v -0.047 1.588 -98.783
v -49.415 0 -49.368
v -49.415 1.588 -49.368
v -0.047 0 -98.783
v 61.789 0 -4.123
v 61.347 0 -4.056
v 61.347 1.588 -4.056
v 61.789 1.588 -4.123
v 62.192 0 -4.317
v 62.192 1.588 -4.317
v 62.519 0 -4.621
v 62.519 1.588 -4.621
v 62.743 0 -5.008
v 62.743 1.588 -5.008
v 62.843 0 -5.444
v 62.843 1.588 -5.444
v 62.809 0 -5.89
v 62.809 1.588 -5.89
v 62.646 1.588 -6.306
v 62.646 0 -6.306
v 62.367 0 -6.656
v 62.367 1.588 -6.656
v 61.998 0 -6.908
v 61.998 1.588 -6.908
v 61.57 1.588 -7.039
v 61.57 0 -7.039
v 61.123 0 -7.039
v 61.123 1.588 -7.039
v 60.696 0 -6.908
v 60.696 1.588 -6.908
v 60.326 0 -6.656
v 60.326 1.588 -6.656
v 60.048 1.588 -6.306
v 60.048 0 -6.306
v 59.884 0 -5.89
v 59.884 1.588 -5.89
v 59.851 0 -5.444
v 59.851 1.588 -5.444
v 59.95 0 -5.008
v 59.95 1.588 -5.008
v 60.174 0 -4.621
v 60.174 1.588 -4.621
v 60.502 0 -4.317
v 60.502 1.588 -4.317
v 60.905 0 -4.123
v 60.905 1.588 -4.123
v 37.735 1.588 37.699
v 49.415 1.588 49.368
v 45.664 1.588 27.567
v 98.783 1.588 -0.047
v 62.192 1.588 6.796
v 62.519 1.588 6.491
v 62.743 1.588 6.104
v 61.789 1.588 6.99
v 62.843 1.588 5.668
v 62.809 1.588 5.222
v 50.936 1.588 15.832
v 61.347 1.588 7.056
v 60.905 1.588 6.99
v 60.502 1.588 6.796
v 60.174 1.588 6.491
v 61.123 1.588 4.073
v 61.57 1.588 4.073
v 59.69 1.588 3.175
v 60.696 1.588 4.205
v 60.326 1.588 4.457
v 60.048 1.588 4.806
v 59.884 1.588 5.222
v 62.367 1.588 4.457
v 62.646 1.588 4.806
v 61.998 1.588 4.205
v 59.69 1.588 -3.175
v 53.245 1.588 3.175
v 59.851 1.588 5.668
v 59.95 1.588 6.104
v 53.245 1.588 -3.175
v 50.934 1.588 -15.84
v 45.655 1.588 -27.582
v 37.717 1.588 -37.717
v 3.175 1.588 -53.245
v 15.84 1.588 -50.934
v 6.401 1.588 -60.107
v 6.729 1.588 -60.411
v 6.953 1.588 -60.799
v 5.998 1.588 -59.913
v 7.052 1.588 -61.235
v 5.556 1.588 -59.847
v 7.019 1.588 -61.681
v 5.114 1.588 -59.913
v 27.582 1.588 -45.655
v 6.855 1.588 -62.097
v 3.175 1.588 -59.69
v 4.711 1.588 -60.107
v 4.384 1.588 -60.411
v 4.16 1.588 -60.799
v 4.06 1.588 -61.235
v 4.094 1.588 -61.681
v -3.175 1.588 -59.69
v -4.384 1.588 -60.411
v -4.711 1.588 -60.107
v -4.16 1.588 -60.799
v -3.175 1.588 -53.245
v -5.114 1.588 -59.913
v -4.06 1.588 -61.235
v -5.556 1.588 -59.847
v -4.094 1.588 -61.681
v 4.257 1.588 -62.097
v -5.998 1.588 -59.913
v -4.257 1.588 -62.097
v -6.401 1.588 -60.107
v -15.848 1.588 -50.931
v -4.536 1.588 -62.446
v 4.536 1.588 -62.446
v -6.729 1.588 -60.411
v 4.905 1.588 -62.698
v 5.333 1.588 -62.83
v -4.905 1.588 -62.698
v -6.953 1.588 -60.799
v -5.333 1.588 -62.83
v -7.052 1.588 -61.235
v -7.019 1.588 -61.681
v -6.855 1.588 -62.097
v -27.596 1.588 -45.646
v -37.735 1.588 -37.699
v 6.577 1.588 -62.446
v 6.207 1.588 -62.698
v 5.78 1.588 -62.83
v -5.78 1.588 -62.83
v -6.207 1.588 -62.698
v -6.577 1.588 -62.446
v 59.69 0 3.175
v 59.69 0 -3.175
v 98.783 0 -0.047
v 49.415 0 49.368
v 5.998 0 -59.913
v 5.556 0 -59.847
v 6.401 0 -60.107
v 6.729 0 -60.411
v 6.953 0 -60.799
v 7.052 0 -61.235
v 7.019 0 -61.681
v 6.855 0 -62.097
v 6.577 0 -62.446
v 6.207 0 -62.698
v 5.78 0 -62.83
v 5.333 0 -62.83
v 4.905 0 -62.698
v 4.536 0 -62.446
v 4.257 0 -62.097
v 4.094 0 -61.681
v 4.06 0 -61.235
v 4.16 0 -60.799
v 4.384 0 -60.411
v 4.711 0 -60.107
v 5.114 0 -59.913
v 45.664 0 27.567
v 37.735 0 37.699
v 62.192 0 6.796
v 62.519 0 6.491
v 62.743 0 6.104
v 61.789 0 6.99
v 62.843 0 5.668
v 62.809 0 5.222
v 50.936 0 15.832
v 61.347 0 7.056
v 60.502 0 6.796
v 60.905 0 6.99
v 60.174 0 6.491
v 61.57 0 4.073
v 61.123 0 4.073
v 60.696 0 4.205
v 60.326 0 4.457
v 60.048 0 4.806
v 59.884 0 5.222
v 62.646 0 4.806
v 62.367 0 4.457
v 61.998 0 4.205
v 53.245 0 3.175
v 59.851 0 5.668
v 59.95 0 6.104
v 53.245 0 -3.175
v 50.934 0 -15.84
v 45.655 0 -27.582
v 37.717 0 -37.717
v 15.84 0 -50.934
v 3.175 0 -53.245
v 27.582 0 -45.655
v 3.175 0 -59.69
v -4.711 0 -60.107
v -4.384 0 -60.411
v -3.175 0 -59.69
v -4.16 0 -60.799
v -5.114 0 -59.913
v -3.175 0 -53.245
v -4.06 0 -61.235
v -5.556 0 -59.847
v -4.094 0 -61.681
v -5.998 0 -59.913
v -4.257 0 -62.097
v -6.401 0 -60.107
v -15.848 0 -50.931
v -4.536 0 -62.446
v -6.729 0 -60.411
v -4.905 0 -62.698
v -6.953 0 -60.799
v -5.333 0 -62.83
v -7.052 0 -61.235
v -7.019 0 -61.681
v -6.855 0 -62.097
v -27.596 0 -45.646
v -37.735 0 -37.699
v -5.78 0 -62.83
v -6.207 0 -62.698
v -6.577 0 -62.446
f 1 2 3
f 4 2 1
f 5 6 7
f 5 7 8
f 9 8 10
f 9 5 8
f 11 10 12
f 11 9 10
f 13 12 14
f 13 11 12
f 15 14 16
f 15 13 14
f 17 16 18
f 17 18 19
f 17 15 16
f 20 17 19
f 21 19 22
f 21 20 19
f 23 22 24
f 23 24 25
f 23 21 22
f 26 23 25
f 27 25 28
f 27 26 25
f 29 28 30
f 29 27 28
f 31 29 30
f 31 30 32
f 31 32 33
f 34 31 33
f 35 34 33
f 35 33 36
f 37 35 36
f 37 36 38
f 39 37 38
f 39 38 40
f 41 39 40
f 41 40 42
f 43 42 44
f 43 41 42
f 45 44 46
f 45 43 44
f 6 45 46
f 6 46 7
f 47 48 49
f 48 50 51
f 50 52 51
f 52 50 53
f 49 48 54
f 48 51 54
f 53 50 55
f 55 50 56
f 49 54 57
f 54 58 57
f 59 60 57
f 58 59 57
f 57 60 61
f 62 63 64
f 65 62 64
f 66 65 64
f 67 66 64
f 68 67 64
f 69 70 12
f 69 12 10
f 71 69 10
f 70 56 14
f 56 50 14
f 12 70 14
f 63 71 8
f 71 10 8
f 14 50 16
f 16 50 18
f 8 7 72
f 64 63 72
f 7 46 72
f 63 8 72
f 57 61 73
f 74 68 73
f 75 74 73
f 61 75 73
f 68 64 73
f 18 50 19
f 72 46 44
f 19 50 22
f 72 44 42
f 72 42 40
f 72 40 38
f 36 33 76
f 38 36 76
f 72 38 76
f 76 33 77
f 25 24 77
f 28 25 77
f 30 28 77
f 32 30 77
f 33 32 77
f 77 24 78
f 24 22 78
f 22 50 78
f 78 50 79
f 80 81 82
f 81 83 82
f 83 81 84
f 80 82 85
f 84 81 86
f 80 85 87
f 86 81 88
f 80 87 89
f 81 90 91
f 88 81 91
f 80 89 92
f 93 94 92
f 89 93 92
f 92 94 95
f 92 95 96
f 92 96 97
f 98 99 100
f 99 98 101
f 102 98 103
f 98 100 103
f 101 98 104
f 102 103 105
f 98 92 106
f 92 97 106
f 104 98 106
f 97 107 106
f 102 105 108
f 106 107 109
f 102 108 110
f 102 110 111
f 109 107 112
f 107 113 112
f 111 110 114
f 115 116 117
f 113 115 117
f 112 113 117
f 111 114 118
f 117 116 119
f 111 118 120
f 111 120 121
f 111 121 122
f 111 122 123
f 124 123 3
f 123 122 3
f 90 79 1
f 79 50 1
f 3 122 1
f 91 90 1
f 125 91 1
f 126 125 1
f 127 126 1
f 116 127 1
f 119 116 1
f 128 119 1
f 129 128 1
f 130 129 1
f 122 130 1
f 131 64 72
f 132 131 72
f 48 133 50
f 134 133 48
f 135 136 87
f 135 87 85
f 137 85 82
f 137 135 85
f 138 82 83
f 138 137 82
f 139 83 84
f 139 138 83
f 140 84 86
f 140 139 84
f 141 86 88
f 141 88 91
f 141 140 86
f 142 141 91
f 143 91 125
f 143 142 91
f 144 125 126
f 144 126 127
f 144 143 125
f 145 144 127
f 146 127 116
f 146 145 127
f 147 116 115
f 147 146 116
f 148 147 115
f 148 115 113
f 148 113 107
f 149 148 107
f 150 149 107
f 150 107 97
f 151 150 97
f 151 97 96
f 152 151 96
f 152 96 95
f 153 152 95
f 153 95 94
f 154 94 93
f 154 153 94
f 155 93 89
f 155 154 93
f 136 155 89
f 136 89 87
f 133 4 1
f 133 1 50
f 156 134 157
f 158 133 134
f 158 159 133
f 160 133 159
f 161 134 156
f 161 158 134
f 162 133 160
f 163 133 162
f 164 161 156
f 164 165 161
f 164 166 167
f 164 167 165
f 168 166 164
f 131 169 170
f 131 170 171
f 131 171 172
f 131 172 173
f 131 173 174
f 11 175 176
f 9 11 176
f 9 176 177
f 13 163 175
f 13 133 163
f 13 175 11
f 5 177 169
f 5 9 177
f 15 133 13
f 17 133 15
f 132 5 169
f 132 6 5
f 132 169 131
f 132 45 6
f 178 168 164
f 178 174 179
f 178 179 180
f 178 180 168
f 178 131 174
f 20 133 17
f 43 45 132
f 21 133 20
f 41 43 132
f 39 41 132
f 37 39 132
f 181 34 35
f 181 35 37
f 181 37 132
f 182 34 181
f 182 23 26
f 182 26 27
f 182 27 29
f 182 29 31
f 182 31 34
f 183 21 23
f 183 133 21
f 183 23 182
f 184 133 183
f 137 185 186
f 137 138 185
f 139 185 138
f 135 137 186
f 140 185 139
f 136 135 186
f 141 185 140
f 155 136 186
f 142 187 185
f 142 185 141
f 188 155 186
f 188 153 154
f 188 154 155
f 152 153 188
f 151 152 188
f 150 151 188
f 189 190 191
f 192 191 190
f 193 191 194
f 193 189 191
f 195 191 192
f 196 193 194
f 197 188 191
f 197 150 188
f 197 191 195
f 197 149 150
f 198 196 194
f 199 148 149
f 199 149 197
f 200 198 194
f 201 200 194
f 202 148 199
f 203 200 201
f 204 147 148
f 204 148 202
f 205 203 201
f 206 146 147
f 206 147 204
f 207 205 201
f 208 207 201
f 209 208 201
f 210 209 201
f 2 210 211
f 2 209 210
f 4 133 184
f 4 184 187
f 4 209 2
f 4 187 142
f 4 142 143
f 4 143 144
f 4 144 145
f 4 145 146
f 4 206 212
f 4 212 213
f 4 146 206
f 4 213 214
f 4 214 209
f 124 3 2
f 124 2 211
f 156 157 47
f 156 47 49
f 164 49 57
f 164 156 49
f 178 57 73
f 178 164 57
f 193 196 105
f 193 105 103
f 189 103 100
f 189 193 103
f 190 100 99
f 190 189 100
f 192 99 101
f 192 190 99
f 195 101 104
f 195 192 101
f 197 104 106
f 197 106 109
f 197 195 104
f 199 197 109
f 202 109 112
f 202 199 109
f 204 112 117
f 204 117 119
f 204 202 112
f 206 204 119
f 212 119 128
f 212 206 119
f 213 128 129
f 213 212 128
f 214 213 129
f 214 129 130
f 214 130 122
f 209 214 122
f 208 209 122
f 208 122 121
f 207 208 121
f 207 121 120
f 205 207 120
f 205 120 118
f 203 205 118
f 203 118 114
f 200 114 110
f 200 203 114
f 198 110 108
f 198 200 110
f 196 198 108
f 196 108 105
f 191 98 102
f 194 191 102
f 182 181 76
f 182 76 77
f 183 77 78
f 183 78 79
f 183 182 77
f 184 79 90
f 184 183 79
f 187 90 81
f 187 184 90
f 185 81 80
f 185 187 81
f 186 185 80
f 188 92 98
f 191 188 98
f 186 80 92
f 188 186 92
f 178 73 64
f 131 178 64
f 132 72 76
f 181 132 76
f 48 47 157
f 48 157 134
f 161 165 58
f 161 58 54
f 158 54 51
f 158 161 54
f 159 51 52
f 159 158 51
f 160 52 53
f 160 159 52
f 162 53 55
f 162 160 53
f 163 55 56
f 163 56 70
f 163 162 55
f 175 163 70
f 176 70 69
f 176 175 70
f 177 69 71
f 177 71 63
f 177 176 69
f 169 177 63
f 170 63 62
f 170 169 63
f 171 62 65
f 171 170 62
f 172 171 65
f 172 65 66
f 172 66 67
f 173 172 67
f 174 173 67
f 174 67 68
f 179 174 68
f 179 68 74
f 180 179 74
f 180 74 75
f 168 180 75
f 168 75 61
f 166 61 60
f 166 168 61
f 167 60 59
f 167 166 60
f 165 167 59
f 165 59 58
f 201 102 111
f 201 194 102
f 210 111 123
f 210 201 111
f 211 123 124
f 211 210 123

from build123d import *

# Parameters (mm, degrees)
SKETCH1_R           = 1.5
SKETCH1_R_2         = 53.34
BOSS_EXTRUDE1_DEPTH = 1.5875
CUT_EXTRUDE3_DEPTH  = 140.70900378
CUT_EXTRUDE4_DEPTH  = 140.70900378


with BuildPart() as part:
    # Sketch1 → Boss-Extrude1 (new body)
    with BuildSketch(Plane(origin=(0, 0, 0), x_dir=(1, 0, 0), z_dir=(0, 1, 0))):
        Polygon((0.047005036, -98.782806148), (-98.782806148, -0.047005036), (-0.047005036, 98.782806148), (98.782806148, 0.047005036), align=None)
        with Locations(Location((-61.346730494, 5.55625, 0), (0, 0, 270))):
            Circle(SKETCH1_R, mode=Mode.SUBTRACT)
        with Locations(Location((-61.346730494, -5.55625, 0), (0, 0, 270))):
            Circle(SKETCH1_R, mode=Mode.SUBTRACT)
        with Locations(Location((-5.55625, -61.346730494, 0), (0, 0, 270))):
            Circle(SKETCH1_R, mode=Mode.SUBTRACT)
        with Locations(Location((5.55625, -61.346730494, 0), (0, 0, 270))):
            Circle(SKETCH1_R, mode=Mode.SUBTRACT)
        with Locations(Location((61.346730494, -5.55625, 0), (0, 0, 270))):
            Circle(SKETCH1_R, mode=Mode.SUBTRACT)
        with Locations(Location((61.346730494, 5.55625, 0), (0, 0, 270))):
            Circle(SKETCH1_R, mode=Mode.SUBTRACT)
        with Locations(Location((5.55625, 61.346730494, 0), (0, 0, 270))):
            Circle(SKETCH1_R, mode=Mode.SUBTRACT)
        with Locations(Location((-5.55625, 61.346730494, 0), (0, 0, 270))):
            Circle(SKETCH1_R, mode=Mode.SUBTRACT)
        with Locations(Location((0, 0, 0), (0, 0, 270))):
            Circle(SKETCH1_R_2, mode=Mode.SUBTRACT)
    extrude(amount=BOSS_EXTRUDE1_DEPTH)

    # Sketch2 → Cut-Extrude3 (cut, through all)
    with BuildSketch(Plane(origin=(0, 1.5875, 0), x_dir=(1, 0, 0), z_dir=(0, 1, 0))):
        Polygon((3.175, 53.34), (3.175, 59.69), (-3.175, 59.69), (-3.175, 53.34), (-3.175, 52.244537665), (3.175, 52.244537665), align=None)
        Polygon((53.34, -3.175), (59.69, -3.175), (59.69, 3.175), (53.34, 3.175), (52.244537665, 3.175), (52.244537665, -3.175), align=None)
        Polygon((-3.175, -53.34), (-3.175, -59.69), (3.175, -59.69), (3.175, -53.34), (3.175, -52.244537665), (-3.175, -52.244537665), align=None)
        Polygon((-53.34, 3.175), (-59.69, 3.175), (-59.69, -3.175), (-53.34, -3.175), (-52.244537665, -3.175), (-52.244537665, 3.175), align=None)
    extrude(amount=-CUT_EXTRUDE3_DEPTH, mode=Mode.SUBTRACT)

    # Sketch3 → Cut-Extrude4 (cut, through all)
    with BuildSketch(Plane(origin=(0, 1.5875, 0), x_dir=(1, 0, 0), z_dir=(0, 1, 0))):
        Polygon((-49.414905592, 49.367900556), (49.414905592, -49.367900556), (0.047005036, -98.782806148), (-98.782806148, -0.047005036), align=None)
    extrude(amount=-CUT_EXTRUDE4_DEPTH, mode=Mode.SUBTRACT)


solid = part.part
